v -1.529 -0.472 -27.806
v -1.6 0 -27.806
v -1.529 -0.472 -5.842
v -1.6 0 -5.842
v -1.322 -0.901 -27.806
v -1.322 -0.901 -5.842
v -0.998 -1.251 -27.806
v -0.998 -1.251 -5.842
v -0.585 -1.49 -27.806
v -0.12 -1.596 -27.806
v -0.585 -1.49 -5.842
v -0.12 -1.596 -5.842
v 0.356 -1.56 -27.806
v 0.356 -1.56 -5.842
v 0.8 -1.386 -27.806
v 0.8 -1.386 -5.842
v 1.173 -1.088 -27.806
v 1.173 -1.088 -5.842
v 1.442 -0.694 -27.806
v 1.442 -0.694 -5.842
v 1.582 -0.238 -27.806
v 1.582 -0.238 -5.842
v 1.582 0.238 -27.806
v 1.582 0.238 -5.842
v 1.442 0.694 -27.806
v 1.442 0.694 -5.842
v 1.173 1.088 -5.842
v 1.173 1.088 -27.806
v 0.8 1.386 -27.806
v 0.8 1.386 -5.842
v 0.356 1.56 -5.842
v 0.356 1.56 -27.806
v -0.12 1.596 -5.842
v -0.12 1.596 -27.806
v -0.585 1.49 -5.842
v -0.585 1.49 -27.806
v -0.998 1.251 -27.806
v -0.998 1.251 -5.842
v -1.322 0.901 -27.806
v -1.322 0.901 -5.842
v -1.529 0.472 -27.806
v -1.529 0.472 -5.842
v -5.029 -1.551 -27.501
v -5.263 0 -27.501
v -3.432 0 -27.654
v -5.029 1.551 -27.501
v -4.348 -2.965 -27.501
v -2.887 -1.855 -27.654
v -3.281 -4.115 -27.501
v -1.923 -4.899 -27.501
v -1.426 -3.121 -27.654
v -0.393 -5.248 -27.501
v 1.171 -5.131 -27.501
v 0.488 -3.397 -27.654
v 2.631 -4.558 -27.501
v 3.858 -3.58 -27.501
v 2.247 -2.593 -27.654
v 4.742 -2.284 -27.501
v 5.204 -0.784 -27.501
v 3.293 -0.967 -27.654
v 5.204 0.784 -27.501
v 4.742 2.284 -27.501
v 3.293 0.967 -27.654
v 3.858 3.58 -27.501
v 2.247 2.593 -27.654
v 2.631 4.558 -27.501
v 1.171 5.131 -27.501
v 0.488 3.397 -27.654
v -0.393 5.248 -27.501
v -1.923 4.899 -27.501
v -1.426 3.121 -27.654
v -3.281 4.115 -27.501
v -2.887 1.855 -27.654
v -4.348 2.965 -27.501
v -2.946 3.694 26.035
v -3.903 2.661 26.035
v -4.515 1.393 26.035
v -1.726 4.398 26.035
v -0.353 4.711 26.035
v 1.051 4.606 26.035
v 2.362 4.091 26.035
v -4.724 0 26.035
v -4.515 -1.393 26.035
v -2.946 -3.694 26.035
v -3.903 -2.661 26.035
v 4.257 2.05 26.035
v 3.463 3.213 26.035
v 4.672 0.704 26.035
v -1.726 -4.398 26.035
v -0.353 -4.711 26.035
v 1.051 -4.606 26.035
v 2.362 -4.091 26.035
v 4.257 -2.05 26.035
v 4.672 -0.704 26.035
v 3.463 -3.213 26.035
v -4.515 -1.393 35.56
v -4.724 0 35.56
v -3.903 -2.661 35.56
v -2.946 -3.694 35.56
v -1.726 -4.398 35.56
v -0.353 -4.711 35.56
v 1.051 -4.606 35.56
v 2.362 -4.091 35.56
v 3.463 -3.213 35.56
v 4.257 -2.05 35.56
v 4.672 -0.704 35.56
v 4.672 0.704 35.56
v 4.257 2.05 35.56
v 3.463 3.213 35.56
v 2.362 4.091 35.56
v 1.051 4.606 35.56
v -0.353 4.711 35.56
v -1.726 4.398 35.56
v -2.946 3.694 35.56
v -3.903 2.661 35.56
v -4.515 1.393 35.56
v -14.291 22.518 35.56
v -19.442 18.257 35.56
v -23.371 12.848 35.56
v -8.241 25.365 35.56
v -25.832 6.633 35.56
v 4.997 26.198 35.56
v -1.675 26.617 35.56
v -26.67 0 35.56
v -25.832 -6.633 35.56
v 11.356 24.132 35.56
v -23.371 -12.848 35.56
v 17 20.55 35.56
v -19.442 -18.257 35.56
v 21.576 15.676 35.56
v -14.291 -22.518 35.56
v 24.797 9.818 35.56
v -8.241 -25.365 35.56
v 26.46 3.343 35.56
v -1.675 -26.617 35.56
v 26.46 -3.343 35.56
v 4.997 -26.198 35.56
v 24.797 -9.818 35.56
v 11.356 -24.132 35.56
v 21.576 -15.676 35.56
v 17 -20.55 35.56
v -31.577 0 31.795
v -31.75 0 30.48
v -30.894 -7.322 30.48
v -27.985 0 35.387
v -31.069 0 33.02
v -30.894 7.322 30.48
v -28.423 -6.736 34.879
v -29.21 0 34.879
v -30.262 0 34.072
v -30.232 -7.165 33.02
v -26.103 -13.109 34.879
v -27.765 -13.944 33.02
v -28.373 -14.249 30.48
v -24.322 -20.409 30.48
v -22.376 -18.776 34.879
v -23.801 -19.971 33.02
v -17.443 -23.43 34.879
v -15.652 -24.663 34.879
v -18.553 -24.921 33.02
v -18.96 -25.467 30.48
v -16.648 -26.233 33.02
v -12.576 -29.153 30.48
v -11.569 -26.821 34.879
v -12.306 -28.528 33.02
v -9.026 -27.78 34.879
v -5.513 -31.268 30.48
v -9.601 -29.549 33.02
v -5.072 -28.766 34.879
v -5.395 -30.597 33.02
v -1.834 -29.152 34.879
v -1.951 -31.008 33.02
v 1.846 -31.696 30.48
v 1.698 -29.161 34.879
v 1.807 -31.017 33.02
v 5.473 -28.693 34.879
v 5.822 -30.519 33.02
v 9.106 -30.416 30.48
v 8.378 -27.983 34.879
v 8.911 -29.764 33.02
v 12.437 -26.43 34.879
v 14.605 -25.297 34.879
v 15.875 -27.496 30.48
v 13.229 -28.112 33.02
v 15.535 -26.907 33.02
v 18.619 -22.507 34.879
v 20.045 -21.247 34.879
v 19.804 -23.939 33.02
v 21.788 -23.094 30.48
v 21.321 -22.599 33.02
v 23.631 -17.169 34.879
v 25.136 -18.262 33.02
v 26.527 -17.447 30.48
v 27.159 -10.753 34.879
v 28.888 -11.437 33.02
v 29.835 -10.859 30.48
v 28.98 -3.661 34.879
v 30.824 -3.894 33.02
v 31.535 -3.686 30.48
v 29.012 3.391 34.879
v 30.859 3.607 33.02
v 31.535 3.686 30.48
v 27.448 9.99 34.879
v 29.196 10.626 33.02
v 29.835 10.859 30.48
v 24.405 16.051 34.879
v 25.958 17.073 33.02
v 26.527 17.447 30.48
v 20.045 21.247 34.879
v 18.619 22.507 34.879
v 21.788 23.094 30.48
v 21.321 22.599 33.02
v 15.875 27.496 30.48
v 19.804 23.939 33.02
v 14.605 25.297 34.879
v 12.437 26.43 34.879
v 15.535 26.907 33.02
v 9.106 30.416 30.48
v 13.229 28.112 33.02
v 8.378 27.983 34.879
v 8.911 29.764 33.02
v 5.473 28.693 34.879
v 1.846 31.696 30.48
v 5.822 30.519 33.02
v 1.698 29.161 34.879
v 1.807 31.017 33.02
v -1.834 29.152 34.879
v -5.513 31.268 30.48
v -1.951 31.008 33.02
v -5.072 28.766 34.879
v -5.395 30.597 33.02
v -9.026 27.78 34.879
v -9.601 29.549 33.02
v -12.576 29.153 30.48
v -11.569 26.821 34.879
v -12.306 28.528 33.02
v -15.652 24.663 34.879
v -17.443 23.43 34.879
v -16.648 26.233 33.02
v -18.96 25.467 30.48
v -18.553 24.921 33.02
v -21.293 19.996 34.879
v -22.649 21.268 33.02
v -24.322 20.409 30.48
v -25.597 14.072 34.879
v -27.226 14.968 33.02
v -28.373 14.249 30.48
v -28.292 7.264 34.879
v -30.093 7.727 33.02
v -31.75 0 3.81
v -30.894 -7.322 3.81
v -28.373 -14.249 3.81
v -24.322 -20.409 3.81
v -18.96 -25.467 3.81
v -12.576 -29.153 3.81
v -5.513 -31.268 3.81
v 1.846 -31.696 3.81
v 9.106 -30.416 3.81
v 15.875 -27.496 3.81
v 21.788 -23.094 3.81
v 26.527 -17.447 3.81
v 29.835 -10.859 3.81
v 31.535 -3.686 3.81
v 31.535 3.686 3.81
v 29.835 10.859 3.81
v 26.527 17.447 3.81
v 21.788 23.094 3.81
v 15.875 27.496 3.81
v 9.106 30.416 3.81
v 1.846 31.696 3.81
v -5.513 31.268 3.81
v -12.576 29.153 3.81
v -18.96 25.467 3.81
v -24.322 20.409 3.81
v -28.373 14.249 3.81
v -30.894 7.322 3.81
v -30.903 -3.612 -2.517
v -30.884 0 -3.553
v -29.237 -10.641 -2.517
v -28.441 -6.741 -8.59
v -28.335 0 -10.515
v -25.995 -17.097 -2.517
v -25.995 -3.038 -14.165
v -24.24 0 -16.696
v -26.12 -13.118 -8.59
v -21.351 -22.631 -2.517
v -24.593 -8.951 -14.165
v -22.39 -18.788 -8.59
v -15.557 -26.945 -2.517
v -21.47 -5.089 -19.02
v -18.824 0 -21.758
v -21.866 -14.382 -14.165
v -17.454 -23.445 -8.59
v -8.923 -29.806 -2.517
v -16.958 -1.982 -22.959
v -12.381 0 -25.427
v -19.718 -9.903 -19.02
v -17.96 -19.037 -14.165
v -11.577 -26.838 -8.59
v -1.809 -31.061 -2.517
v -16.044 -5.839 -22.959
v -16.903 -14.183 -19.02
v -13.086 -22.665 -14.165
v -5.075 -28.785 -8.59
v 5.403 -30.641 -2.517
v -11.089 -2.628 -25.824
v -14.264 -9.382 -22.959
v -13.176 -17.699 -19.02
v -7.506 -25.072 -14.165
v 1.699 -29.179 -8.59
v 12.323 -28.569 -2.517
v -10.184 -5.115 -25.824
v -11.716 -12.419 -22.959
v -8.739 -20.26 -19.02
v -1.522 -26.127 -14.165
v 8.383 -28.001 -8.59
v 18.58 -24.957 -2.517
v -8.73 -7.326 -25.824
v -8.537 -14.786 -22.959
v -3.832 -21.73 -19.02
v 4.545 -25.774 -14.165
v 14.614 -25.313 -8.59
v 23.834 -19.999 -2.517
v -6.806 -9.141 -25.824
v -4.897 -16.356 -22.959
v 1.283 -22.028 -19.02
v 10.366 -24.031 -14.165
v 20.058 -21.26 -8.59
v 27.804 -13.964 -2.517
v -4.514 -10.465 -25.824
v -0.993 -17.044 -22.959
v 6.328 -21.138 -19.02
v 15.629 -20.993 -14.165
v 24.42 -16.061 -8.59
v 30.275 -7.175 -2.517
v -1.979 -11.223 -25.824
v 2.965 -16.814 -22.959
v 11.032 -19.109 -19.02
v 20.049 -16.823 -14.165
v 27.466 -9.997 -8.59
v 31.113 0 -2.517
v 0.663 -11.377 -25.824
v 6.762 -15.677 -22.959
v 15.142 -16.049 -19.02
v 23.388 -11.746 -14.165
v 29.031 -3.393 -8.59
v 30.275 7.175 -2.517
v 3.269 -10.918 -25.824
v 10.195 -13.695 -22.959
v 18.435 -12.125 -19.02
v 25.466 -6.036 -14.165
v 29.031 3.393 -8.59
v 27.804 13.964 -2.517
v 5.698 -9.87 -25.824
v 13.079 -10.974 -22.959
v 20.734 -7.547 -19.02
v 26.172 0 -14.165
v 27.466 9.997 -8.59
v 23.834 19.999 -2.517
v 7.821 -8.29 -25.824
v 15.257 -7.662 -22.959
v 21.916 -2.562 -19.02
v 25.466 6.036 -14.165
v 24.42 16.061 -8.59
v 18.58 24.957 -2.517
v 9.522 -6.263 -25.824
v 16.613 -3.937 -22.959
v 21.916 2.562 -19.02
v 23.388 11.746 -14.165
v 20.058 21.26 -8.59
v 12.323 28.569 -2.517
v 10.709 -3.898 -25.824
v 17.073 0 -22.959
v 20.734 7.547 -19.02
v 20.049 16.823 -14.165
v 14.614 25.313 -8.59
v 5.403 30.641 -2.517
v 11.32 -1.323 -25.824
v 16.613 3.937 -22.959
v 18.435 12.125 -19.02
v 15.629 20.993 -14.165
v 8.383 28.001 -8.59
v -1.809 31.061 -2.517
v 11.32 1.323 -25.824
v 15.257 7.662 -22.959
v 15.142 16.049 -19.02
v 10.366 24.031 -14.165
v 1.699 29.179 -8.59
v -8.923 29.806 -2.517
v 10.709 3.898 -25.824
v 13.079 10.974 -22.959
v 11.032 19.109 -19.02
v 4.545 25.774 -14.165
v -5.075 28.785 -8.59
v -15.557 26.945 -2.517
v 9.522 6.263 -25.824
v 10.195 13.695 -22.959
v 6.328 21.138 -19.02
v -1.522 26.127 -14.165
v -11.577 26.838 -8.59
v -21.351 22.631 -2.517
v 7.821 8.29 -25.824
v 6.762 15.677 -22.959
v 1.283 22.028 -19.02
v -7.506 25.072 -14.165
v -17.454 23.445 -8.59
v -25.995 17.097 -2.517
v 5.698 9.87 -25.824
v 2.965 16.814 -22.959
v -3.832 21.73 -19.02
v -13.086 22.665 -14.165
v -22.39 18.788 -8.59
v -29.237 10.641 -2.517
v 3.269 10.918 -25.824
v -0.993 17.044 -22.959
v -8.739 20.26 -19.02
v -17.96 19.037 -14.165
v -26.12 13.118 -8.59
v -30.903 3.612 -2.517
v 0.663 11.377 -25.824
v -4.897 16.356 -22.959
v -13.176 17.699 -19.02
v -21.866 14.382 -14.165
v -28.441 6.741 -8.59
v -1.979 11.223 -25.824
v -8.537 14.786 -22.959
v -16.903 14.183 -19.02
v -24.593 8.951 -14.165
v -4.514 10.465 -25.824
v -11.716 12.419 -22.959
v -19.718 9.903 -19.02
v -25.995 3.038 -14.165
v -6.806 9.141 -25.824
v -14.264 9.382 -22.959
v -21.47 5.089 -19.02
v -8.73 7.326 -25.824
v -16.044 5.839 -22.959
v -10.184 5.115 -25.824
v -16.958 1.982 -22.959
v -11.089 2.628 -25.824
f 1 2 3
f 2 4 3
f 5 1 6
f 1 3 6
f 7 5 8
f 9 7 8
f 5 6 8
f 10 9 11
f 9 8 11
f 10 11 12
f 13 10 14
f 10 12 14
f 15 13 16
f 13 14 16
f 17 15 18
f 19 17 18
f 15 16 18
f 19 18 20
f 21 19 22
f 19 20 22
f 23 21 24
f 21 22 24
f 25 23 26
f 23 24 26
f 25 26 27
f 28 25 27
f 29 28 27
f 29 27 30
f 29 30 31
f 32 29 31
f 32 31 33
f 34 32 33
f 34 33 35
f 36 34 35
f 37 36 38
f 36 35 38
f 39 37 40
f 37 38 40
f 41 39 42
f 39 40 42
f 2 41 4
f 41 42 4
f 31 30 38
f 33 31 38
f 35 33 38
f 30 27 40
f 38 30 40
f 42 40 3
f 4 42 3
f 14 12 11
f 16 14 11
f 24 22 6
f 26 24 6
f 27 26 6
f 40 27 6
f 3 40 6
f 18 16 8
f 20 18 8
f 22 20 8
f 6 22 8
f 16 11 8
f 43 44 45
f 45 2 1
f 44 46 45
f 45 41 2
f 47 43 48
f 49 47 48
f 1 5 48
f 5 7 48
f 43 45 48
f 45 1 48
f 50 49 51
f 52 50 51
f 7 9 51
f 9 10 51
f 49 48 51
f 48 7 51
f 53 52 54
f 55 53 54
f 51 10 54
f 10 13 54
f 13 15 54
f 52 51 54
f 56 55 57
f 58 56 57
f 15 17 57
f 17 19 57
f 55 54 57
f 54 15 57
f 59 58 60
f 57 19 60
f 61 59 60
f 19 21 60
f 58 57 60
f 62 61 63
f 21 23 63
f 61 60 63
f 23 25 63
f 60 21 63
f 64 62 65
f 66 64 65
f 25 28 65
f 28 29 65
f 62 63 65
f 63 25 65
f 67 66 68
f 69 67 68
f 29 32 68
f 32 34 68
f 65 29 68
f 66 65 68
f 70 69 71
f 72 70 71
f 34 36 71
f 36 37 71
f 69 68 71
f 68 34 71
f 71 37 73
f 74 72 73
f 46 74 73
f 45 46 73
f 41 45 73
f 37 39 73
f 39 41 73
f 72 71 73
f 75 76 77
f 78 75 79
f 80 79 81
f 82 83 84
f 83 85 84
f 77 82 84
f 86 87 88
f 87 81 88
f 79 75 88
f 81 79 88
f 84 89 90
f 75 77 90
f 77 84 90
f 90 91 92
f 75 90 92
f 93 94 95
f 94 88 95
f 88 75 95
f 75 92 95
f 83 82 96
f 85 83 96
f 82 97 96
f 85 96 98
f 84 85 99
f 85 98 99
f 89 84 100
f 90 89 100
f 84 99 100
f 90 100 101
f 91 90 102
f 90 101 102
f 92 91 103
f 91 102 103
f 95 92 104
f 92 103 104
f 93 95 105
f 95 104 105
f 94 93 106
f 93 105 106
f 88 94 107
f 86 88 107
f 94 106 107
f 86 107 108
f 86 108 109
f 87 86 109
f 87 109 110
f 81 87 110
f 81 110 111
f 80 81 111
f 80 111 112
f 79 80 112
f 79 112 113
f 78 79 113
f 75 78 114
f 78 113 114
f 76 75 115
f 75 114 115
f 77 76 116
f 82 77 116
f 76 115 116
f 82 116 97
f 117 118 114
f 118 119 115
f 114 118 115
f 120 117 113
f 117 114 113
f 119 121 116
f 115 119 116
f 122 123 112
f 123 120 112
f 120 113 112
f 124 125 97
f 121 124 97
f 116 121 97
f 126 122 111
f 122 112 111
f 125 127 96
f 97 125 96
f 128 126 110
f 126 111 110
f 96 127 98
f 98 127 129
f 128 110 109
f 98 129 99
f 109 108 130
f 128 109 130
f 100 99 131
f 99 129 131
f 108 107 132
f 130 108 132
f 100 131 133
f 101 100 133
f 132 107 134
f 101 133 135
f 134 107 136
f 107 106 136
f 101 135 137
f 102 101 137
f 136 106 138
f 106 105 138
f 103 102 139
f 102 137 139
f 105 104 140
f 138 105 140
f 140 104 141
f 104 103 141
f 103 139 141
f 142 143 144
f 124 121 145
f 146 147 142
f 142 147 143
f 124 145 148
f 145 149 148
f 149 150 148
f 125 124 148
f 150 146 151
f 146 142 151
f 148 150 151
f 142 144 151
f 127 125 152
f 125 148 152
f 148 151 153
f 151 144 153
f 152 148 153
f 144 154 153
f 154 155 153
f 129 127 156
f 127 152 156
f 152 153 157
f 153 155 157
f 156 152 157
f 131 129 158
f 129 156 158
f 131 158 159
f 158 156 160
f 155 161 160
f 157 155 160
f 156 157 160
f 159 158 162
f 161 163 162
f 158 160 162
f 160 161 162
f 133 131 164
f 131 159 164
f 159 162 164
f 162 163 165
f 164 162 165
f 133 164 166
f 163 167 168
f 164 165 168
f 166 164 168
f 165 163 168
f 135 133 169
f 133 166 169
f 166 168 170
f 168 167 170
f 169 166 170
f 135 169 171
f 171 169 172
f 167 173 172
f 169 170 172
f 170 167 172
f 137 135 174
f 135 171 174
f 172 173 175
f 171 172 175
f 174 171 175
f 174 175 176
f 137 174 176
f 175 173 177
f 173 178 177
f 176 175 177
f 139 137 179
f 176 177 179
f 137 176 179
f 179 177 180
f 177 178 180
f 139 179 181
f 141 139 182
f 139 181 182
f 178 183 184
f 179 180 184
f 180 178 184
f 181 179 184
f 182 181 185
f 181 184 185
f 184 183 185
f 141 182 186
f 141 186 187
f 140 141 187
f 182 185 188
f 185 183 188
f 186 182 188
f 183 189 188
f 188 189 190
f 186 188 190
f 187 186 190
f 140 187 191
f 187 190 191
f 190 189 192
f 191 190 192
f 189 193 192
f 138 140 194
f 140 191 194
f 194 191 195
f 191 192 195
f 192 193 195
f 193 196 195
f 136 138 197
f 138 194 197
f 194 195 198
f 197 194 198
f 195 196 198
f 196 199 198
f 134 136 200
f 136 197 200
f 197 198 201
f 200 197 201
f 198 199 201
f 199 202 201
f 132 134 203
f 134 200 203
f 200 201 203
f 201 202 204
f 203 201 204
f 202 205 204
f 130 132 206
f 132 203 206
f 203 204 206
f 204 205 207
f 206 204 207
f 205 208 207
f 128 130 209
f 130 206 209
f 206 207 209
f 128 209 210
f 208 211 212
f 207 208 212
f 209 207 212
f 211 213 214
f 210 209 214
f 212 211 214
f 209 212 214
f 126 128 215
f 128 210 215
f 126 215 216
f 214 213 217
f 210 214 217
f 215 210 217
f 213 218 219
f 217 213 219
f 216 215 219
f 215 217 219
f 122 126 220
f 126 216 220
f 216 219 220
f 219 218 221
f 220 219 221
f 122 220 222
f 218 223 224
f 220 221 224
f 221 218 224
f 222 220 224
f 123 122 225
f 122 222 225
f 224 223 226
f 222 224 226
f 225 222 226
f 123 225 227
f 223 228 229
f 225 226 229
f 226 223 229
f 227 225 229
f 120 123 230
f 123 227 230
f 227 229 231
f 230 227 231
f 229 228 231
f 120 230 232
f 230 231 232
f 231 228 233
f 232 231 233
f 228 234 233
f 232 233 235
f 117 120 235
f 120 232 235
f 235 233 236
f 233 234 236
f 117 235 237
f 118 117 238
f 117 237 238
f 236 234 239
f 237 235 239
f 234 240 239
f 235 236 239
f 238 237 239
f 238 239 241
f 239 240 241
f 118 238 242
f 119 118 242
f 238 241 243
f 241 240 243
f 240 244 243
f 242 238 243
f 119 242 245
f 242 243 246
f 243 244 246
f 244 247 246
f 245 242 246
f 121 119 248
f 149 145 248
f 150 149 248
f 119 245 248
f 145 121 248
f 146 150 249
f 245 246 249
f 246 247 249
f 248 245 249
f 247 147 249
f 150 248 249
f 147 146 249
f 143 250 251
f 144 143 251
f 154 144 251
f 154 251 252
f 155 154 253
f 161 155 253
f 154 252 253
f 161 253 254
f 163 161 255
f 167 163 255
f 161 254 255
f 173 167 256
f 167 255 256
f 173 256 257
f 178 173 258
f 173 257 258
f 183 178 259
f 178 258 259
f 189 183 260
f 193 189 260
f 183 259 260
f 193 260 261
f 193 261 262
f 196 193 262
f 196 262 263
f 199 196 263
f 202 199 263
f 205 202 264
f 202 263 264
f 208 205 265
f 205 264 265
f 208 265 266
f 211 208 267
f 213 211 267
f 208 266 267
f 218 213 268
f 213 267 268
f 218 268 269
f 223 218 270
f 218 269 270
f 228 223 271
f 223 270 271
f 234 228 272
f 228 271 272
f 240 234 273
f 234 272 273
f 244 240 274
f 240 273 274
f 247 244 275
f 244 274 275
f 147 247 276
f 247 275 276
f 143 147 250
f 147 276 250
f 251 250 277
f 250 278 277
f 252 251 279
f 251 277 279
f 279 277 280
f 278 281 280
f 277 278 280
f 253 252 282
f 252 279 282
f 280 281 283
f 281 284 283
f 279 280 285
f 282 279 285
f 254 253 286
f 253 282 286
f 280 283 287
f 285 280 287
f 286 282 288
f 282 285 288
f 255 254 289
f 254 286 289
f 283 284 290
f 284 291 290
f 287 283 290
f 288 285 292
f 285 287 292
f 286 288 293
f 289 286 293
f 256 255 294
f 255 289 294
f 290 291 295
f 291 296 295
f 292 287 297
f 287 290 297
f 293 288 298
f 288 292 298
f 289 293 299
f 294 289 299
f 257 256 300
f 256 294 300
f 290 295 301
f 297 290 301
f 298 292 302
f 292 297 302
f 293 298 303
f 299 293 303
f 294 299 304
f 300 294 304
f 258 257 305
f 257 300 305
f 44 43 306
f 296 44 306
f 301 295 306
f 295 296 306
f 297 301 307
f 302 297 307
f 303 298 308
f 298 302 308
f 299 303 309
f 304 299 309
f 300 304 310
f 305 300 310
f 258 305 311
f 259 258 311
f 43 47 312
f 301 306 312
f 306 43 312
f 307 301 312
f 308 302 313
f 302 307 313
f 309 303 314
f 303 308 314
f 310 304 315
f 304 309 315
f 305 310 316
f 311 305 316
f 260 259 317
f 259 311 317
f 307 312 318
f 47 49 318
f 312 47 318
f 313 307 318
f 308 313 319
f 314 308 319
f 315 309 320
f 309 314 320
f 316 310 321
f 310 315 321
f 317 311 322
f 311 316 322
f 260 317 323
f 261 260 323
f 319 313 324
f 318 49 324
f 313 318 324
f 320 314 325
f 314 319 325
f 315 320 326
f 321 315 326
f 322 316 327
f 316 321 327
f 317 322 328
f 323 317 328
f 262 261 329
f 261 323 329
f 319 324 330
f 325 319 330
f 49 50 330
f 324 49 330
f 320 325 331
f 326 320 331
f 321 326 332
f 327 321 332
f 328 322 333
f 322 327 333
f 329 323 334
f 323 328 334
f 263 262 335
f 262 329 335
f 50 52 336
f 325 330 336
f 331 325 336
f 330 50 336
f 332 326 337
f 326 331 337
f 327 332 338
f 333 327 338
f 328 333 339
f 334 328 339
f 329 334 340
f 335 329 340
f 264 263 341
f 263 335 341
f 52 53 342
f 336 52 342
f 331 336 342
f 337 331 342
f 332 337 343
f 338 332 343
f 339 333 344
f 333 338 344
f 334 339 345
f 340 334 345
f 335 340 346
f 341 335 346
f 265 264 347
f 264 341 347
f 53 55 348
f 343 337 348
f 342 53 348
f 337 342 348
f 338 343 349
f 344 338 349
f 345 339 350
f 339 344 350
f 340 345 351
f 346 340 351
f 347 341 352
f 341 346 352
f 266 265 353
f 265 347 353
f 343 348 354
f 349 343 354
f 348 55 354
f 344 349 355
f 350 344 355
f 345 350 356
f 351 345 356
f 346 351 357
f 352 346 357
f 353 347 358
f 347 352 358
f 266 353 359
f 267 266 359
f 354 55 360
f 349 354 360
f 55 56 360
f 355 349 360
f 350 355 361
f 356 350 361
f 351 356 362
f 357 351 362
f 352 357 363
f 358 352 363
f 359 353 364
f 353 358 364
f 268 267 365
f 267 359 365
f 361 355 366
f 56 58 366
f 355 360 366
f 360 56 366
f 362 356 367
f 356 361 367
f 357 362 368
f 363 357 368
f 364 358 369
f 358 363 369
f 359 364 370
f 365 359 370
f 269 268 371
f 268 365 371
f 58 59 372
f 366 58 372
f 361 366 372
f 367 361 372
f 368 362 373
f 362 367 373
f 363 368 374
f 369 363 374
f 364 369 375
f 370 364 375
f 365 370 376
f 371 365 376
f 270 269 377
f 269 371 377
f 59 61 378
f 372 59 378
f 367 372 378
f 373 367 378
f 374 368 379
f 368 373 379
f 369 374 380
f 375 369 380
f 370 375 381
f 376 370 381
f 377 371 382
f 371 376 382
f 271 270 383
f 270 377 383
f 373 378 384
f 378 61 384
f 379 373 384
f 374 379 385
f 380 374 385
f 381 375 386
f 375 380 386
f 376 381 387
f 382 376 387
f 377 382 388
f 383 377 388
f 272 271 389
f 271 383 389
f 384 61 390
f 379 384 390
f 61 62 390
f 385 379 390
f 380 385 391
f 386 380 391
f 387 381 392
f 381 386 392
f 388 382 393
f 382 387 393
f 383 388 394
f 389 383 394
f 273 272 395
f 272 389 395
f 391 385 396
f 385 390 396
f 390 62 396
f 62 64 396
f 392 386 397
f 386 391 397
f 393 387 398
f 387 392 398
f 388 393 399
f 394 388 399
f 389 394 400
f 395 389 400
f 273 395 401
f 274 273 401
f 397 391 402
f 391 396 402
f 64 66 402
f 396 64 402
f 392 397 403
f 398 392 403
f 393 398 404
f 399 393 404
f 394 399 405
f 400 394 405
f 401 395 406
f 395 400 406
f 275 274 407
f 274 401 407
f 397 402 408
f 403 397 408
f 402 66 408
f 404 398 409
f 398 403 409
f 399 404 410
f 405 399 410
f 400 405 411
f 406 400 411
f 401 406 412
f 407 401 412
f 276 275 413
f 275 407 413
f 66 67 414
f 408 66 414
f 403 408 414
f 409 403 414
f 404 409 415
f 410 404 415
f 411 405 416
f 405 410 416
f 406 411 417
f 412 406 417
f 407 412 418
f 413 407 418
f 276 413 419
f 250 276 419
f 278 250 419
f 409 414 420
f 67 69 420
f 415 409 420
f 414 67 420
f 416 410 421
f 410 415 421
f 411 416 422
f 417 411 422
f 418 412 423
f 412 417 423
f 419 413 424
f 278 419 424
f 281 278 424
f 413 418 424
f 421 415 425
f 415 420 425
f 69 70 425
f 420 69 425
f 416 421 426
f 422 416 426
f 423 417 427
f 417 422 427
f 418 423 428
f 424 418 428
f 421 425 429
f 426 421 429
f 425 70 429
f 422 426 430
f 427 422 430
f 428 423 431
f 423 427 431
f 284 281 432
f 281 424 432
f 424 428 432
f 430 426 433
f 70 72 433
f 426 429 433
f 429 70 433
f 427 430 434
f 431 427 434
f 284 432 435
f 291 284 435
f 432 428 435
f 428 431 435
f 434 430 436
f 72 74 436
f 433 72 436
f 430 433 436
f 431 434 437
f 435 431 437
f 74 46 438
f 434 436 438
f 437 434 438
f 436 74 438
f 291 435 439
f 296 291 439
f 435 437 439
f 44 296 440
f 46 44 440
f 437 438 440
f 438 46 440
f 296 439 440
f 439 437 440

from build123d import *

# Parameters (mm, degrees)
F3_R = 5.08
F5_R = 5.08


# Not quite as in the source:
# - a feature names something its author has since deleted; it is built from what else it names


with BuildPart() as f1:
    # F0 (on Front) → F1 (revolve)
    with BuildSketch(Plane.XZ):
        with BuildLine():
            Line((0, -5.842), (0, 0))
            Line((0, 0), (0, 3.81))
            Line((0, 3.81), (0, 16.51))
            Line((0, 16.51), (0, 26.035))
            Line((0, 26.035), (-4.7244, 26.035))
            Line((-4.7244, 26.035), (-4.7244, 35.56))
            Line((-4.7244, 35.56), (-7.2644, 35.56))
            Line((-7.2644, 35.56), (-31.75, 35.56))
            Line((-31.75, 35.56), (-31.75, 3.81))
            ThreePointArc((-31.75, 3.81), (-24.2400753332, -16.6956394155), (-5.2629922621, -27.5007555394))
            Line((-5.2629922621, -27.5007555394), (-1.6002, -27.8064487898))
            Line((-1.6002, -27.8064487898), (-1.6002, -5.842))
            Line((-1.6002, -5.842), (0, -5.842))
        make_face()
    revolve(axis=Axis((0, 0, 3.81), (0, 0, 1)))

    # F5
    f5_edges = [f1.edges().sort_by_distance(p)[0] for p in [
        (31.75, 0, 35.56),
    ]]
    fillet(f5_edges, radius=F5_R)


with BuildPart() as f2:
    # F0 (on Front) → F2 (revolve)
    with BuildSketch(Plane.XZ):
        with BuildLine():
            Line((0, -5.842), (0, 0))
            Line((0, 0), (0, 3.81))
            Line((0, 3.81), (0, 16.51))
            Line((0, 16.51), (0, 26.035))
            Line((0, 26.035), (-4.7244, 26.035))
            Line((-4.7244, 26.035), (-4.7244, 35.56))
            Line((-4.7244, 35.56), (-7.2644, 35.56))
            Line((-7.2644, 35.56), (-31.75, 35.56))
            Line((-31.75, 35.56), (-31.75, 3.81))
            ThreePointArc((-31.75, 3.81), (-24.2400753332, -16.6956394155), (-5.2629922621, -27.5007555394))
            Line((-5.2629922621, -27.5007555394), (-1.6002, -27.8064487898))
            Line((-1.6002, -27.8064487898), (-1.6002, -5.842))
            Line((-1.6002, -5.842), (0, -5.842))
        make_face()
    revolve(axis=Axis((0, 0, 3.81), (0, 0, 1)))

    # F3
    f3_edges = [f2.edges().sort_by_distance(p)[0] for p in [
        (31.75, 0, 35.56),
    ]]
    fillet(f3_edges, radius=F3_R)


solid = f1.part
